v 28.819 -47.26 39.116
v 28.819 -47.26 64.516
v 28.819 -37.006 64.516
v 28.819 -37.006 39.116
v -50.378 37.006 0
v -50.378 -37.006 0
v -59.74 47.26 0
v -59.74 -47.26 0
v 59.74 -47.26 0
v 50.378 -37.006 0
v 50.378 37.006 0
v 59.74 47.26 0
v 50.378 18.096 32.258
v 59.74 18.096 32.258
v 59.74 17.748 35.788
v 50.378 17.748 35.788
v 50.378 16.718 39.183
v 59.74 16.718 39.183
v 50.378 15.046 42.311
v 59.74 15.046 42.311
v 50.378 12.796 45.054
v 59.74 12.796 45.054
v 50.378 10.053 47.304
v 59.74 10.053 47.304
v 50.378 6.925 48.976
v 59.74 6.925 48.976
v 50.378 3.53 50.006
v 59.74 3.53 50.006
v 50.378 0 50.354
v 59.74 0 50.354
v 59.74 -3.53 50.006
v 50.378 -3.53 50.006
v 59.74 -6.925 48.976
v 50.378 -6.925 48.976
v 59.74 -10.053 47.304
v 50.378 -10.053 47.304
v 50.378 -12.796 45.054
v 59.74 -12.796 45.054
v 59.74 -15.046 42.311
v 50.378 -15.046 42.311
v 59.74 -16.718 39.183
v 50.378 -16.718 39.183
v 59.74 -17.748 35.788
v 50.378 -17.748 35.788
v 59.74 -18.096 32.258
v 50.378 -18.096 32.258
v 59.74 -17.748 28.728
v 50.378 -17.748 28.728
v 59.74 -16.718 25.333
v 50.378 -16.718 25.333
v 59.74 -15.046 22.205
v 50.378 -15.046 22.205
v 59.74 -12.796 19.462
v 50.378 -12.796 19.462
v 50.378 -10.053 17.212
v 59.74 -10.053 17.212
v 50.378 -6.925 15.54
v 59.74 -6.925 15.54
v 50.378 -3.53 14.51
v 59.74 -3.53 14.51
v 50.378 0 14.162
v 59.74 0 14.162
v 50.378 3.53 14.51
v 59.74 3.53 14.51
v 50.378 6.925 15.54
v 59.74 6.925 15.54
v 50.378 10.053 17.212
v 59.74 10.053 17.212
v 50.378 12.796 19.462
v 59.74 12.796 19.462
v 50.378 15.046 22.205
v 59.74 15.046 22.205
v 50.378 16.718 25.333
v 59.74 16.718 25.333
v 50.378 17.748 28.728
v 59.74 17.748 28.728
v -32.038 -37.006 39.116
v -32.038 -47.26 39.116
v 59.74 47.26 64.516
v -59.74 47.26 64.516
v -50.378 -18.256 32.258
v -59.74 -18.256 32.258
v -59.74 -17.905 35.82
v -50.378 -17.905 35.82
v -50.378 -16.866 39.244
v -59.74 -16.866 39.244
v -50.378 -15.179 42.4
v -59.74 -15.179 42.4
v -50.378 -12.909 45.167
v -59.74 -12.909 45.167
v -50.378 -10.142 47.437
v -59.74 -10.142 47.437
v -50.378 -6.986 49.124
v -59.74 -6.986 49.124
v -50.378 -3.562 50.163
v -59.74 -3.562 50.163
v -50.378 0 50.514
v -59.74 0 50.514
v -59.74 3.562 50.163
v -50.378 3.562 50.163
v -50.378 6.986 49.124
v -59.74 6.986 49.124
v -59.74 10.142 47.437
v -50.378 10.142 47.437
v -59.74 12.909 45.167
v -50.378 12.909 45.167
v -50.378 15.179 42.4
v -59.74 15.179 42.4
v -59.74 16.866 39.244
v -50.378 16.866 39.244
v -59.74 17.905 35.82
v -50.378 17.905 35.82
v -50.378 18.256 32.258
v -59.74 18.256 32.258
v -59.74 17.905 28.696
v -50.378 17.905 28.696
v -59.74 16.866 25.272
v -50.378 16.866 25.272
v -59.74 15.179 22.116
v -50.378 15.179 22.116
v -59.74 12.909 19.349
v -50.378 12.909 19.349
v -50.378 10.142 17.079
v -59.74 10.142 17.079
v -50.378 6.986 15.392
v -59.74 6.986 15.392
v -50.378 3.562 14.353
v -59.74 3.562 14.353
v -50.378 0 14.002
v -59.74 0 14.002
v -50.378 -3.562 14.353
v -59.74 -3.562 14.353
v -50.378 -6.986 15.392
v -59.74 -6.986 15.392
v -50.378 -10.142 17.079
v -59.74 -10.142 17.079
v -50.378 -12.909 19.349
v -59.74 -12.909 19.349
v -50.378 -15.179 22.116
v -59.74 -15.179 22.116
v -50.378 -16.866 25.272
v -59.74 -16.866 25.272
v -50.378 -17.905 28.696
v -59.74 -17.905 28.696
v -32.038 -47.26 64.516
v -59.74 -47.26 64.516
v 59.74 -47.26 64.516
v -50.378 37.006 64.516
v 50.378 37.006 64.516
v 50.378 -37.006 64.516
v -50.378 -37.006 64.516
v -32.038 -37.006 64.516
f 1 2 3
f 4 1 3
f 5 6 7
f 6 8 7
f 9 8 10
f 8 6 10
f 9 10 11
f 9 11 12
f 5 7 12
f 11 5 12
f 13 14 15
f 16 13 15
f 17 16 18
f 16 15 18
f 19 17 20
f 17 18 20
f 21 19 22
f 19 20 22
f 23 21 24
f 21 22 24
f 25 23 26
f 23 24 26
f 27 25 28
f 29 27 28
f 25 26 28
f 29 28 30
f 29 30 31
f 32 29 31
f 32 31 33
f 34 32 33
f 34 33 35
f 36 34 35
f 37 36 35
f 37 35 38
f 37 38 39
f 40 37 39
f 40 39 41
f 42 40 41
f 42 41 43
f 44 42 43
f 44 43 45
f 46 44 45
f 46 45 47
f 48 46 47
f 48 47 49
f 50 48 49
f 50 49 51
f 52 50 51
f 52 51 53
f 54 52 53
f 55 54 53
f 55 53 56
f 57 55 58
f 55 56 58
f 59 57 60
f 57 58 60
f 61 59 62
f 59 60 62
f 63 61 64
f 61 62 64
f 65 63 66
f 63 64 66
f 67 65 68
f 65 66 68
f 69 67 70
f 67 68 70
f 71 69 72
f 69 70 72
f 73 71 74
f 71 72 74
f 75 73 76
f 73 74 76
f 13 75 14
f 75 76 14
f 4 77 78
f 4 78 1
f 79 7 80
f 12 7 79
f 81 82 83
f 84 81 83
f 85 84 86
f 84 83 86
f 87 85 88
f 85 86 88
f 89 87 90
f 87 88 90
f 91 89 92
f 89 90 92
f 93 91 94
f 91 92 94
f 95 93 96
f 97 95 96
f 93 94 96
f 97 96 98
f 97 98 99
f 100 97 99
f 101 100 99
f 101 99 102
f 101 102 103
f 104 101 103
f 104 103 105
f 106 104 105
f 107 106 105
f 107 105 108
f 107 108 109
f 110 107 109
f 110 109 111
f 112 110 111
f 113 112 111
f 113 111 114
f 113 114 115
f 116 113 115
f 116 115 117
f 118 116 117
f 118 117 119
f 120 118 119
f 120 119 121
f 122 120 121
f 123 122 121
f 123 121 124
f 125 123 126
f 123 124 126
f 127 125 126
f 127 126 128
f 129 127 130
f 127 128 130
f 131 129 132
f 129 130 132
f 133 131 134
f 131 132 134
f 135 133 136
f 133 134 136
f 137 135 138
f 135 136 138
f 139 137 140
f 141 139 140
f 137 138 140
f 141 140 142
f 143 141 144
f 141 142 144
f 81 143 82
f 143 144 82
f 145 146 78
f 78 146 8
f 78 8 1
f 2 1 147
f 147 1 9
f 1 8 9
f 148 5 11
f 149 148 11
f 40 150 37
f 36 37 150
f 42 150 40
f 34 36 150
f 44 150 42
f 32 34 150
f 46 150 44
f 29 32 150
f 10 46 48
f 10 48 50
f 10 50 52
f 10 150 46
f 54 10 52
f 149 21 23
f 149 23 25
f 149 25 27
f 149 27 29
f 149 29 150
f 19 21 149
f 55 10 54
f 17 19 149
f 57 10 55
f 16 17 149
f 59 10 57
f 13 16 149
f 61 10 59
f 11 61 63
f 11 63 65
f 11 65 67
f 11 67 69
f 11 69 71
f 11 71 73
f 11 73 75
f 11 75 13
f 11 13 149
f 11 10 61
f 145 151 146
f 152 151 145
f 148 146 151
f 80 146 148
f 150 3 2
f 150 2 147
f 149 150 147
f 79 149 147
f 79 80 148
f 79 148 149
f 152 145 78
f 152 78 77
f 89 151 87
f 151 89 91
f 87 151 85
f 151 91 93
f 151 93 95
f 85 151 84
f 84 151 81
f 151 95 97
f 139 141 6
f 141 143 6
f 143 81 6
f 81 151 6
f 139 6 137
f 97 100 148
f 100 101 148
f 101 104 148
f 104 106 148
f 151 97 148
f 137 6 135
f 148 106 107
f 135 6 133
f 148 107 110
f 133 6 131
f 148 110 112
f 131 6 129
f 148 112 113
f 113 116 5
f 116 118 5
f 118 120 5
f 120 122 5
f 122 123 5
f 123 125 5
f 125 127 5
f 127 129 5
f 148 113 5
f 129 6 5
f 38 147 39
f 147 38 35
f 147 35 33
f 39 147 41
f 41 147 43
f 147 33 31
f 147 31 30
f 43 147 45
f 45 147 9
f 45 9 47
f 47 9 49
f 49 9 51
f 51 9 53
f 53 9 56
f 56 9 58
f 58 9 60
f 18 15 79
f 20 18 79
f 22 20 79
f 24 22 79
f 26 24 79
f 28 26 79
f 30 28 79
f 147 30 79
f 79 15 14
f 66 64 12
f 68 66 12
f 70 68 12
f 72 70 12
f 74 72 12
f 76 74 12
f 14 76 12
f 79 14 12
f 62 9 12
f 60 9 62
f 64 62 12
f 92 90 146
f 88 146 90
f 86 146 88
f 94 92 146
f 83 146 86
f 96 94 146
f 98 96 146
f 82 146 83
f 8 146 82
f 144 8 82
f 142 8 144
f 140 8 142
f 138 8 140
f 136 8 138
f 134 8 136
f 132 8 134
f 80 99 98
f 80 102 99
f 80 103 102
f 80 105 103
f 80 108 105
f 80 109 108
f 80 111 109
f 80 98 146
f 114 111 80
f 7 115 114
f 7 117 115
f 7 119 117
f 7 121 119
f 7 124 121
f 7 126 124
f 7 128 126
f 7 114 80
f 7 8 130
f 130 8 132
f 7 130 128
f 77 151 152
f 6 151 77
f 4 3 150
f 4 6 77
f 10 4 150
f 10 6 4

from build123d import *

# Parameters (mm, degrees)
F0_W     = 119.480312
F0_H     = 94.520986
F0_W_2   = 100.755788
F0_H_2   = 74.011498
F1_DEPTH = 64.516
F2_W     = 60.856506
F2_H     = 10.254744
F3_DEPTH = 25.4
F4_R     = 18.095764
F5_DEPTH = 25.4
F6_R     = 18.255686
F7_DEPTH = 25.4


with BuildPart() as f1:
    # F0 (on Top) → F1 (new body)
    with BuildSketch(Plane.XY):
        Rectangle(F0_W, F0_H)
        Rectangle(F0_W_2, F0_H_2, mode=Mode.SUBTRACT)
    extrude(amount=F1_DEPTH)

    # F2 (on face) → F3 (cut)
    with BuildSketch(Plane.XY.offset(64.516)):
        with Locations((-1.609653, -42.133121)):
            Rectangle(F2_W, F2_H)
    extrude(amount=-F3_DEPTH, mode=Mode.SUBTRACT)

    # F4 (on face) → F5 (cut)
    with BuildSketch(Plane.YZ.offset(59.740156)):
        with Locations((0, 32.258)):
            Circle(F4_R)
    extrude(amount=-F5_DEPTH, mode=Mode.SUBTRACT)

    # F6 (on face) → F7 (cut)
    with BuildSketch(Plane(origin=(-59.740156, 0, 0), x_dir=(0, -1, 0), z_dir=(-1, 0, 0))):
        with Locations((0, 32.258)):
            Circle(F6_R)
    extrude(amount=-F7_DEPTH, mode=Mode.SUBTRACT)


solid = f1.part
